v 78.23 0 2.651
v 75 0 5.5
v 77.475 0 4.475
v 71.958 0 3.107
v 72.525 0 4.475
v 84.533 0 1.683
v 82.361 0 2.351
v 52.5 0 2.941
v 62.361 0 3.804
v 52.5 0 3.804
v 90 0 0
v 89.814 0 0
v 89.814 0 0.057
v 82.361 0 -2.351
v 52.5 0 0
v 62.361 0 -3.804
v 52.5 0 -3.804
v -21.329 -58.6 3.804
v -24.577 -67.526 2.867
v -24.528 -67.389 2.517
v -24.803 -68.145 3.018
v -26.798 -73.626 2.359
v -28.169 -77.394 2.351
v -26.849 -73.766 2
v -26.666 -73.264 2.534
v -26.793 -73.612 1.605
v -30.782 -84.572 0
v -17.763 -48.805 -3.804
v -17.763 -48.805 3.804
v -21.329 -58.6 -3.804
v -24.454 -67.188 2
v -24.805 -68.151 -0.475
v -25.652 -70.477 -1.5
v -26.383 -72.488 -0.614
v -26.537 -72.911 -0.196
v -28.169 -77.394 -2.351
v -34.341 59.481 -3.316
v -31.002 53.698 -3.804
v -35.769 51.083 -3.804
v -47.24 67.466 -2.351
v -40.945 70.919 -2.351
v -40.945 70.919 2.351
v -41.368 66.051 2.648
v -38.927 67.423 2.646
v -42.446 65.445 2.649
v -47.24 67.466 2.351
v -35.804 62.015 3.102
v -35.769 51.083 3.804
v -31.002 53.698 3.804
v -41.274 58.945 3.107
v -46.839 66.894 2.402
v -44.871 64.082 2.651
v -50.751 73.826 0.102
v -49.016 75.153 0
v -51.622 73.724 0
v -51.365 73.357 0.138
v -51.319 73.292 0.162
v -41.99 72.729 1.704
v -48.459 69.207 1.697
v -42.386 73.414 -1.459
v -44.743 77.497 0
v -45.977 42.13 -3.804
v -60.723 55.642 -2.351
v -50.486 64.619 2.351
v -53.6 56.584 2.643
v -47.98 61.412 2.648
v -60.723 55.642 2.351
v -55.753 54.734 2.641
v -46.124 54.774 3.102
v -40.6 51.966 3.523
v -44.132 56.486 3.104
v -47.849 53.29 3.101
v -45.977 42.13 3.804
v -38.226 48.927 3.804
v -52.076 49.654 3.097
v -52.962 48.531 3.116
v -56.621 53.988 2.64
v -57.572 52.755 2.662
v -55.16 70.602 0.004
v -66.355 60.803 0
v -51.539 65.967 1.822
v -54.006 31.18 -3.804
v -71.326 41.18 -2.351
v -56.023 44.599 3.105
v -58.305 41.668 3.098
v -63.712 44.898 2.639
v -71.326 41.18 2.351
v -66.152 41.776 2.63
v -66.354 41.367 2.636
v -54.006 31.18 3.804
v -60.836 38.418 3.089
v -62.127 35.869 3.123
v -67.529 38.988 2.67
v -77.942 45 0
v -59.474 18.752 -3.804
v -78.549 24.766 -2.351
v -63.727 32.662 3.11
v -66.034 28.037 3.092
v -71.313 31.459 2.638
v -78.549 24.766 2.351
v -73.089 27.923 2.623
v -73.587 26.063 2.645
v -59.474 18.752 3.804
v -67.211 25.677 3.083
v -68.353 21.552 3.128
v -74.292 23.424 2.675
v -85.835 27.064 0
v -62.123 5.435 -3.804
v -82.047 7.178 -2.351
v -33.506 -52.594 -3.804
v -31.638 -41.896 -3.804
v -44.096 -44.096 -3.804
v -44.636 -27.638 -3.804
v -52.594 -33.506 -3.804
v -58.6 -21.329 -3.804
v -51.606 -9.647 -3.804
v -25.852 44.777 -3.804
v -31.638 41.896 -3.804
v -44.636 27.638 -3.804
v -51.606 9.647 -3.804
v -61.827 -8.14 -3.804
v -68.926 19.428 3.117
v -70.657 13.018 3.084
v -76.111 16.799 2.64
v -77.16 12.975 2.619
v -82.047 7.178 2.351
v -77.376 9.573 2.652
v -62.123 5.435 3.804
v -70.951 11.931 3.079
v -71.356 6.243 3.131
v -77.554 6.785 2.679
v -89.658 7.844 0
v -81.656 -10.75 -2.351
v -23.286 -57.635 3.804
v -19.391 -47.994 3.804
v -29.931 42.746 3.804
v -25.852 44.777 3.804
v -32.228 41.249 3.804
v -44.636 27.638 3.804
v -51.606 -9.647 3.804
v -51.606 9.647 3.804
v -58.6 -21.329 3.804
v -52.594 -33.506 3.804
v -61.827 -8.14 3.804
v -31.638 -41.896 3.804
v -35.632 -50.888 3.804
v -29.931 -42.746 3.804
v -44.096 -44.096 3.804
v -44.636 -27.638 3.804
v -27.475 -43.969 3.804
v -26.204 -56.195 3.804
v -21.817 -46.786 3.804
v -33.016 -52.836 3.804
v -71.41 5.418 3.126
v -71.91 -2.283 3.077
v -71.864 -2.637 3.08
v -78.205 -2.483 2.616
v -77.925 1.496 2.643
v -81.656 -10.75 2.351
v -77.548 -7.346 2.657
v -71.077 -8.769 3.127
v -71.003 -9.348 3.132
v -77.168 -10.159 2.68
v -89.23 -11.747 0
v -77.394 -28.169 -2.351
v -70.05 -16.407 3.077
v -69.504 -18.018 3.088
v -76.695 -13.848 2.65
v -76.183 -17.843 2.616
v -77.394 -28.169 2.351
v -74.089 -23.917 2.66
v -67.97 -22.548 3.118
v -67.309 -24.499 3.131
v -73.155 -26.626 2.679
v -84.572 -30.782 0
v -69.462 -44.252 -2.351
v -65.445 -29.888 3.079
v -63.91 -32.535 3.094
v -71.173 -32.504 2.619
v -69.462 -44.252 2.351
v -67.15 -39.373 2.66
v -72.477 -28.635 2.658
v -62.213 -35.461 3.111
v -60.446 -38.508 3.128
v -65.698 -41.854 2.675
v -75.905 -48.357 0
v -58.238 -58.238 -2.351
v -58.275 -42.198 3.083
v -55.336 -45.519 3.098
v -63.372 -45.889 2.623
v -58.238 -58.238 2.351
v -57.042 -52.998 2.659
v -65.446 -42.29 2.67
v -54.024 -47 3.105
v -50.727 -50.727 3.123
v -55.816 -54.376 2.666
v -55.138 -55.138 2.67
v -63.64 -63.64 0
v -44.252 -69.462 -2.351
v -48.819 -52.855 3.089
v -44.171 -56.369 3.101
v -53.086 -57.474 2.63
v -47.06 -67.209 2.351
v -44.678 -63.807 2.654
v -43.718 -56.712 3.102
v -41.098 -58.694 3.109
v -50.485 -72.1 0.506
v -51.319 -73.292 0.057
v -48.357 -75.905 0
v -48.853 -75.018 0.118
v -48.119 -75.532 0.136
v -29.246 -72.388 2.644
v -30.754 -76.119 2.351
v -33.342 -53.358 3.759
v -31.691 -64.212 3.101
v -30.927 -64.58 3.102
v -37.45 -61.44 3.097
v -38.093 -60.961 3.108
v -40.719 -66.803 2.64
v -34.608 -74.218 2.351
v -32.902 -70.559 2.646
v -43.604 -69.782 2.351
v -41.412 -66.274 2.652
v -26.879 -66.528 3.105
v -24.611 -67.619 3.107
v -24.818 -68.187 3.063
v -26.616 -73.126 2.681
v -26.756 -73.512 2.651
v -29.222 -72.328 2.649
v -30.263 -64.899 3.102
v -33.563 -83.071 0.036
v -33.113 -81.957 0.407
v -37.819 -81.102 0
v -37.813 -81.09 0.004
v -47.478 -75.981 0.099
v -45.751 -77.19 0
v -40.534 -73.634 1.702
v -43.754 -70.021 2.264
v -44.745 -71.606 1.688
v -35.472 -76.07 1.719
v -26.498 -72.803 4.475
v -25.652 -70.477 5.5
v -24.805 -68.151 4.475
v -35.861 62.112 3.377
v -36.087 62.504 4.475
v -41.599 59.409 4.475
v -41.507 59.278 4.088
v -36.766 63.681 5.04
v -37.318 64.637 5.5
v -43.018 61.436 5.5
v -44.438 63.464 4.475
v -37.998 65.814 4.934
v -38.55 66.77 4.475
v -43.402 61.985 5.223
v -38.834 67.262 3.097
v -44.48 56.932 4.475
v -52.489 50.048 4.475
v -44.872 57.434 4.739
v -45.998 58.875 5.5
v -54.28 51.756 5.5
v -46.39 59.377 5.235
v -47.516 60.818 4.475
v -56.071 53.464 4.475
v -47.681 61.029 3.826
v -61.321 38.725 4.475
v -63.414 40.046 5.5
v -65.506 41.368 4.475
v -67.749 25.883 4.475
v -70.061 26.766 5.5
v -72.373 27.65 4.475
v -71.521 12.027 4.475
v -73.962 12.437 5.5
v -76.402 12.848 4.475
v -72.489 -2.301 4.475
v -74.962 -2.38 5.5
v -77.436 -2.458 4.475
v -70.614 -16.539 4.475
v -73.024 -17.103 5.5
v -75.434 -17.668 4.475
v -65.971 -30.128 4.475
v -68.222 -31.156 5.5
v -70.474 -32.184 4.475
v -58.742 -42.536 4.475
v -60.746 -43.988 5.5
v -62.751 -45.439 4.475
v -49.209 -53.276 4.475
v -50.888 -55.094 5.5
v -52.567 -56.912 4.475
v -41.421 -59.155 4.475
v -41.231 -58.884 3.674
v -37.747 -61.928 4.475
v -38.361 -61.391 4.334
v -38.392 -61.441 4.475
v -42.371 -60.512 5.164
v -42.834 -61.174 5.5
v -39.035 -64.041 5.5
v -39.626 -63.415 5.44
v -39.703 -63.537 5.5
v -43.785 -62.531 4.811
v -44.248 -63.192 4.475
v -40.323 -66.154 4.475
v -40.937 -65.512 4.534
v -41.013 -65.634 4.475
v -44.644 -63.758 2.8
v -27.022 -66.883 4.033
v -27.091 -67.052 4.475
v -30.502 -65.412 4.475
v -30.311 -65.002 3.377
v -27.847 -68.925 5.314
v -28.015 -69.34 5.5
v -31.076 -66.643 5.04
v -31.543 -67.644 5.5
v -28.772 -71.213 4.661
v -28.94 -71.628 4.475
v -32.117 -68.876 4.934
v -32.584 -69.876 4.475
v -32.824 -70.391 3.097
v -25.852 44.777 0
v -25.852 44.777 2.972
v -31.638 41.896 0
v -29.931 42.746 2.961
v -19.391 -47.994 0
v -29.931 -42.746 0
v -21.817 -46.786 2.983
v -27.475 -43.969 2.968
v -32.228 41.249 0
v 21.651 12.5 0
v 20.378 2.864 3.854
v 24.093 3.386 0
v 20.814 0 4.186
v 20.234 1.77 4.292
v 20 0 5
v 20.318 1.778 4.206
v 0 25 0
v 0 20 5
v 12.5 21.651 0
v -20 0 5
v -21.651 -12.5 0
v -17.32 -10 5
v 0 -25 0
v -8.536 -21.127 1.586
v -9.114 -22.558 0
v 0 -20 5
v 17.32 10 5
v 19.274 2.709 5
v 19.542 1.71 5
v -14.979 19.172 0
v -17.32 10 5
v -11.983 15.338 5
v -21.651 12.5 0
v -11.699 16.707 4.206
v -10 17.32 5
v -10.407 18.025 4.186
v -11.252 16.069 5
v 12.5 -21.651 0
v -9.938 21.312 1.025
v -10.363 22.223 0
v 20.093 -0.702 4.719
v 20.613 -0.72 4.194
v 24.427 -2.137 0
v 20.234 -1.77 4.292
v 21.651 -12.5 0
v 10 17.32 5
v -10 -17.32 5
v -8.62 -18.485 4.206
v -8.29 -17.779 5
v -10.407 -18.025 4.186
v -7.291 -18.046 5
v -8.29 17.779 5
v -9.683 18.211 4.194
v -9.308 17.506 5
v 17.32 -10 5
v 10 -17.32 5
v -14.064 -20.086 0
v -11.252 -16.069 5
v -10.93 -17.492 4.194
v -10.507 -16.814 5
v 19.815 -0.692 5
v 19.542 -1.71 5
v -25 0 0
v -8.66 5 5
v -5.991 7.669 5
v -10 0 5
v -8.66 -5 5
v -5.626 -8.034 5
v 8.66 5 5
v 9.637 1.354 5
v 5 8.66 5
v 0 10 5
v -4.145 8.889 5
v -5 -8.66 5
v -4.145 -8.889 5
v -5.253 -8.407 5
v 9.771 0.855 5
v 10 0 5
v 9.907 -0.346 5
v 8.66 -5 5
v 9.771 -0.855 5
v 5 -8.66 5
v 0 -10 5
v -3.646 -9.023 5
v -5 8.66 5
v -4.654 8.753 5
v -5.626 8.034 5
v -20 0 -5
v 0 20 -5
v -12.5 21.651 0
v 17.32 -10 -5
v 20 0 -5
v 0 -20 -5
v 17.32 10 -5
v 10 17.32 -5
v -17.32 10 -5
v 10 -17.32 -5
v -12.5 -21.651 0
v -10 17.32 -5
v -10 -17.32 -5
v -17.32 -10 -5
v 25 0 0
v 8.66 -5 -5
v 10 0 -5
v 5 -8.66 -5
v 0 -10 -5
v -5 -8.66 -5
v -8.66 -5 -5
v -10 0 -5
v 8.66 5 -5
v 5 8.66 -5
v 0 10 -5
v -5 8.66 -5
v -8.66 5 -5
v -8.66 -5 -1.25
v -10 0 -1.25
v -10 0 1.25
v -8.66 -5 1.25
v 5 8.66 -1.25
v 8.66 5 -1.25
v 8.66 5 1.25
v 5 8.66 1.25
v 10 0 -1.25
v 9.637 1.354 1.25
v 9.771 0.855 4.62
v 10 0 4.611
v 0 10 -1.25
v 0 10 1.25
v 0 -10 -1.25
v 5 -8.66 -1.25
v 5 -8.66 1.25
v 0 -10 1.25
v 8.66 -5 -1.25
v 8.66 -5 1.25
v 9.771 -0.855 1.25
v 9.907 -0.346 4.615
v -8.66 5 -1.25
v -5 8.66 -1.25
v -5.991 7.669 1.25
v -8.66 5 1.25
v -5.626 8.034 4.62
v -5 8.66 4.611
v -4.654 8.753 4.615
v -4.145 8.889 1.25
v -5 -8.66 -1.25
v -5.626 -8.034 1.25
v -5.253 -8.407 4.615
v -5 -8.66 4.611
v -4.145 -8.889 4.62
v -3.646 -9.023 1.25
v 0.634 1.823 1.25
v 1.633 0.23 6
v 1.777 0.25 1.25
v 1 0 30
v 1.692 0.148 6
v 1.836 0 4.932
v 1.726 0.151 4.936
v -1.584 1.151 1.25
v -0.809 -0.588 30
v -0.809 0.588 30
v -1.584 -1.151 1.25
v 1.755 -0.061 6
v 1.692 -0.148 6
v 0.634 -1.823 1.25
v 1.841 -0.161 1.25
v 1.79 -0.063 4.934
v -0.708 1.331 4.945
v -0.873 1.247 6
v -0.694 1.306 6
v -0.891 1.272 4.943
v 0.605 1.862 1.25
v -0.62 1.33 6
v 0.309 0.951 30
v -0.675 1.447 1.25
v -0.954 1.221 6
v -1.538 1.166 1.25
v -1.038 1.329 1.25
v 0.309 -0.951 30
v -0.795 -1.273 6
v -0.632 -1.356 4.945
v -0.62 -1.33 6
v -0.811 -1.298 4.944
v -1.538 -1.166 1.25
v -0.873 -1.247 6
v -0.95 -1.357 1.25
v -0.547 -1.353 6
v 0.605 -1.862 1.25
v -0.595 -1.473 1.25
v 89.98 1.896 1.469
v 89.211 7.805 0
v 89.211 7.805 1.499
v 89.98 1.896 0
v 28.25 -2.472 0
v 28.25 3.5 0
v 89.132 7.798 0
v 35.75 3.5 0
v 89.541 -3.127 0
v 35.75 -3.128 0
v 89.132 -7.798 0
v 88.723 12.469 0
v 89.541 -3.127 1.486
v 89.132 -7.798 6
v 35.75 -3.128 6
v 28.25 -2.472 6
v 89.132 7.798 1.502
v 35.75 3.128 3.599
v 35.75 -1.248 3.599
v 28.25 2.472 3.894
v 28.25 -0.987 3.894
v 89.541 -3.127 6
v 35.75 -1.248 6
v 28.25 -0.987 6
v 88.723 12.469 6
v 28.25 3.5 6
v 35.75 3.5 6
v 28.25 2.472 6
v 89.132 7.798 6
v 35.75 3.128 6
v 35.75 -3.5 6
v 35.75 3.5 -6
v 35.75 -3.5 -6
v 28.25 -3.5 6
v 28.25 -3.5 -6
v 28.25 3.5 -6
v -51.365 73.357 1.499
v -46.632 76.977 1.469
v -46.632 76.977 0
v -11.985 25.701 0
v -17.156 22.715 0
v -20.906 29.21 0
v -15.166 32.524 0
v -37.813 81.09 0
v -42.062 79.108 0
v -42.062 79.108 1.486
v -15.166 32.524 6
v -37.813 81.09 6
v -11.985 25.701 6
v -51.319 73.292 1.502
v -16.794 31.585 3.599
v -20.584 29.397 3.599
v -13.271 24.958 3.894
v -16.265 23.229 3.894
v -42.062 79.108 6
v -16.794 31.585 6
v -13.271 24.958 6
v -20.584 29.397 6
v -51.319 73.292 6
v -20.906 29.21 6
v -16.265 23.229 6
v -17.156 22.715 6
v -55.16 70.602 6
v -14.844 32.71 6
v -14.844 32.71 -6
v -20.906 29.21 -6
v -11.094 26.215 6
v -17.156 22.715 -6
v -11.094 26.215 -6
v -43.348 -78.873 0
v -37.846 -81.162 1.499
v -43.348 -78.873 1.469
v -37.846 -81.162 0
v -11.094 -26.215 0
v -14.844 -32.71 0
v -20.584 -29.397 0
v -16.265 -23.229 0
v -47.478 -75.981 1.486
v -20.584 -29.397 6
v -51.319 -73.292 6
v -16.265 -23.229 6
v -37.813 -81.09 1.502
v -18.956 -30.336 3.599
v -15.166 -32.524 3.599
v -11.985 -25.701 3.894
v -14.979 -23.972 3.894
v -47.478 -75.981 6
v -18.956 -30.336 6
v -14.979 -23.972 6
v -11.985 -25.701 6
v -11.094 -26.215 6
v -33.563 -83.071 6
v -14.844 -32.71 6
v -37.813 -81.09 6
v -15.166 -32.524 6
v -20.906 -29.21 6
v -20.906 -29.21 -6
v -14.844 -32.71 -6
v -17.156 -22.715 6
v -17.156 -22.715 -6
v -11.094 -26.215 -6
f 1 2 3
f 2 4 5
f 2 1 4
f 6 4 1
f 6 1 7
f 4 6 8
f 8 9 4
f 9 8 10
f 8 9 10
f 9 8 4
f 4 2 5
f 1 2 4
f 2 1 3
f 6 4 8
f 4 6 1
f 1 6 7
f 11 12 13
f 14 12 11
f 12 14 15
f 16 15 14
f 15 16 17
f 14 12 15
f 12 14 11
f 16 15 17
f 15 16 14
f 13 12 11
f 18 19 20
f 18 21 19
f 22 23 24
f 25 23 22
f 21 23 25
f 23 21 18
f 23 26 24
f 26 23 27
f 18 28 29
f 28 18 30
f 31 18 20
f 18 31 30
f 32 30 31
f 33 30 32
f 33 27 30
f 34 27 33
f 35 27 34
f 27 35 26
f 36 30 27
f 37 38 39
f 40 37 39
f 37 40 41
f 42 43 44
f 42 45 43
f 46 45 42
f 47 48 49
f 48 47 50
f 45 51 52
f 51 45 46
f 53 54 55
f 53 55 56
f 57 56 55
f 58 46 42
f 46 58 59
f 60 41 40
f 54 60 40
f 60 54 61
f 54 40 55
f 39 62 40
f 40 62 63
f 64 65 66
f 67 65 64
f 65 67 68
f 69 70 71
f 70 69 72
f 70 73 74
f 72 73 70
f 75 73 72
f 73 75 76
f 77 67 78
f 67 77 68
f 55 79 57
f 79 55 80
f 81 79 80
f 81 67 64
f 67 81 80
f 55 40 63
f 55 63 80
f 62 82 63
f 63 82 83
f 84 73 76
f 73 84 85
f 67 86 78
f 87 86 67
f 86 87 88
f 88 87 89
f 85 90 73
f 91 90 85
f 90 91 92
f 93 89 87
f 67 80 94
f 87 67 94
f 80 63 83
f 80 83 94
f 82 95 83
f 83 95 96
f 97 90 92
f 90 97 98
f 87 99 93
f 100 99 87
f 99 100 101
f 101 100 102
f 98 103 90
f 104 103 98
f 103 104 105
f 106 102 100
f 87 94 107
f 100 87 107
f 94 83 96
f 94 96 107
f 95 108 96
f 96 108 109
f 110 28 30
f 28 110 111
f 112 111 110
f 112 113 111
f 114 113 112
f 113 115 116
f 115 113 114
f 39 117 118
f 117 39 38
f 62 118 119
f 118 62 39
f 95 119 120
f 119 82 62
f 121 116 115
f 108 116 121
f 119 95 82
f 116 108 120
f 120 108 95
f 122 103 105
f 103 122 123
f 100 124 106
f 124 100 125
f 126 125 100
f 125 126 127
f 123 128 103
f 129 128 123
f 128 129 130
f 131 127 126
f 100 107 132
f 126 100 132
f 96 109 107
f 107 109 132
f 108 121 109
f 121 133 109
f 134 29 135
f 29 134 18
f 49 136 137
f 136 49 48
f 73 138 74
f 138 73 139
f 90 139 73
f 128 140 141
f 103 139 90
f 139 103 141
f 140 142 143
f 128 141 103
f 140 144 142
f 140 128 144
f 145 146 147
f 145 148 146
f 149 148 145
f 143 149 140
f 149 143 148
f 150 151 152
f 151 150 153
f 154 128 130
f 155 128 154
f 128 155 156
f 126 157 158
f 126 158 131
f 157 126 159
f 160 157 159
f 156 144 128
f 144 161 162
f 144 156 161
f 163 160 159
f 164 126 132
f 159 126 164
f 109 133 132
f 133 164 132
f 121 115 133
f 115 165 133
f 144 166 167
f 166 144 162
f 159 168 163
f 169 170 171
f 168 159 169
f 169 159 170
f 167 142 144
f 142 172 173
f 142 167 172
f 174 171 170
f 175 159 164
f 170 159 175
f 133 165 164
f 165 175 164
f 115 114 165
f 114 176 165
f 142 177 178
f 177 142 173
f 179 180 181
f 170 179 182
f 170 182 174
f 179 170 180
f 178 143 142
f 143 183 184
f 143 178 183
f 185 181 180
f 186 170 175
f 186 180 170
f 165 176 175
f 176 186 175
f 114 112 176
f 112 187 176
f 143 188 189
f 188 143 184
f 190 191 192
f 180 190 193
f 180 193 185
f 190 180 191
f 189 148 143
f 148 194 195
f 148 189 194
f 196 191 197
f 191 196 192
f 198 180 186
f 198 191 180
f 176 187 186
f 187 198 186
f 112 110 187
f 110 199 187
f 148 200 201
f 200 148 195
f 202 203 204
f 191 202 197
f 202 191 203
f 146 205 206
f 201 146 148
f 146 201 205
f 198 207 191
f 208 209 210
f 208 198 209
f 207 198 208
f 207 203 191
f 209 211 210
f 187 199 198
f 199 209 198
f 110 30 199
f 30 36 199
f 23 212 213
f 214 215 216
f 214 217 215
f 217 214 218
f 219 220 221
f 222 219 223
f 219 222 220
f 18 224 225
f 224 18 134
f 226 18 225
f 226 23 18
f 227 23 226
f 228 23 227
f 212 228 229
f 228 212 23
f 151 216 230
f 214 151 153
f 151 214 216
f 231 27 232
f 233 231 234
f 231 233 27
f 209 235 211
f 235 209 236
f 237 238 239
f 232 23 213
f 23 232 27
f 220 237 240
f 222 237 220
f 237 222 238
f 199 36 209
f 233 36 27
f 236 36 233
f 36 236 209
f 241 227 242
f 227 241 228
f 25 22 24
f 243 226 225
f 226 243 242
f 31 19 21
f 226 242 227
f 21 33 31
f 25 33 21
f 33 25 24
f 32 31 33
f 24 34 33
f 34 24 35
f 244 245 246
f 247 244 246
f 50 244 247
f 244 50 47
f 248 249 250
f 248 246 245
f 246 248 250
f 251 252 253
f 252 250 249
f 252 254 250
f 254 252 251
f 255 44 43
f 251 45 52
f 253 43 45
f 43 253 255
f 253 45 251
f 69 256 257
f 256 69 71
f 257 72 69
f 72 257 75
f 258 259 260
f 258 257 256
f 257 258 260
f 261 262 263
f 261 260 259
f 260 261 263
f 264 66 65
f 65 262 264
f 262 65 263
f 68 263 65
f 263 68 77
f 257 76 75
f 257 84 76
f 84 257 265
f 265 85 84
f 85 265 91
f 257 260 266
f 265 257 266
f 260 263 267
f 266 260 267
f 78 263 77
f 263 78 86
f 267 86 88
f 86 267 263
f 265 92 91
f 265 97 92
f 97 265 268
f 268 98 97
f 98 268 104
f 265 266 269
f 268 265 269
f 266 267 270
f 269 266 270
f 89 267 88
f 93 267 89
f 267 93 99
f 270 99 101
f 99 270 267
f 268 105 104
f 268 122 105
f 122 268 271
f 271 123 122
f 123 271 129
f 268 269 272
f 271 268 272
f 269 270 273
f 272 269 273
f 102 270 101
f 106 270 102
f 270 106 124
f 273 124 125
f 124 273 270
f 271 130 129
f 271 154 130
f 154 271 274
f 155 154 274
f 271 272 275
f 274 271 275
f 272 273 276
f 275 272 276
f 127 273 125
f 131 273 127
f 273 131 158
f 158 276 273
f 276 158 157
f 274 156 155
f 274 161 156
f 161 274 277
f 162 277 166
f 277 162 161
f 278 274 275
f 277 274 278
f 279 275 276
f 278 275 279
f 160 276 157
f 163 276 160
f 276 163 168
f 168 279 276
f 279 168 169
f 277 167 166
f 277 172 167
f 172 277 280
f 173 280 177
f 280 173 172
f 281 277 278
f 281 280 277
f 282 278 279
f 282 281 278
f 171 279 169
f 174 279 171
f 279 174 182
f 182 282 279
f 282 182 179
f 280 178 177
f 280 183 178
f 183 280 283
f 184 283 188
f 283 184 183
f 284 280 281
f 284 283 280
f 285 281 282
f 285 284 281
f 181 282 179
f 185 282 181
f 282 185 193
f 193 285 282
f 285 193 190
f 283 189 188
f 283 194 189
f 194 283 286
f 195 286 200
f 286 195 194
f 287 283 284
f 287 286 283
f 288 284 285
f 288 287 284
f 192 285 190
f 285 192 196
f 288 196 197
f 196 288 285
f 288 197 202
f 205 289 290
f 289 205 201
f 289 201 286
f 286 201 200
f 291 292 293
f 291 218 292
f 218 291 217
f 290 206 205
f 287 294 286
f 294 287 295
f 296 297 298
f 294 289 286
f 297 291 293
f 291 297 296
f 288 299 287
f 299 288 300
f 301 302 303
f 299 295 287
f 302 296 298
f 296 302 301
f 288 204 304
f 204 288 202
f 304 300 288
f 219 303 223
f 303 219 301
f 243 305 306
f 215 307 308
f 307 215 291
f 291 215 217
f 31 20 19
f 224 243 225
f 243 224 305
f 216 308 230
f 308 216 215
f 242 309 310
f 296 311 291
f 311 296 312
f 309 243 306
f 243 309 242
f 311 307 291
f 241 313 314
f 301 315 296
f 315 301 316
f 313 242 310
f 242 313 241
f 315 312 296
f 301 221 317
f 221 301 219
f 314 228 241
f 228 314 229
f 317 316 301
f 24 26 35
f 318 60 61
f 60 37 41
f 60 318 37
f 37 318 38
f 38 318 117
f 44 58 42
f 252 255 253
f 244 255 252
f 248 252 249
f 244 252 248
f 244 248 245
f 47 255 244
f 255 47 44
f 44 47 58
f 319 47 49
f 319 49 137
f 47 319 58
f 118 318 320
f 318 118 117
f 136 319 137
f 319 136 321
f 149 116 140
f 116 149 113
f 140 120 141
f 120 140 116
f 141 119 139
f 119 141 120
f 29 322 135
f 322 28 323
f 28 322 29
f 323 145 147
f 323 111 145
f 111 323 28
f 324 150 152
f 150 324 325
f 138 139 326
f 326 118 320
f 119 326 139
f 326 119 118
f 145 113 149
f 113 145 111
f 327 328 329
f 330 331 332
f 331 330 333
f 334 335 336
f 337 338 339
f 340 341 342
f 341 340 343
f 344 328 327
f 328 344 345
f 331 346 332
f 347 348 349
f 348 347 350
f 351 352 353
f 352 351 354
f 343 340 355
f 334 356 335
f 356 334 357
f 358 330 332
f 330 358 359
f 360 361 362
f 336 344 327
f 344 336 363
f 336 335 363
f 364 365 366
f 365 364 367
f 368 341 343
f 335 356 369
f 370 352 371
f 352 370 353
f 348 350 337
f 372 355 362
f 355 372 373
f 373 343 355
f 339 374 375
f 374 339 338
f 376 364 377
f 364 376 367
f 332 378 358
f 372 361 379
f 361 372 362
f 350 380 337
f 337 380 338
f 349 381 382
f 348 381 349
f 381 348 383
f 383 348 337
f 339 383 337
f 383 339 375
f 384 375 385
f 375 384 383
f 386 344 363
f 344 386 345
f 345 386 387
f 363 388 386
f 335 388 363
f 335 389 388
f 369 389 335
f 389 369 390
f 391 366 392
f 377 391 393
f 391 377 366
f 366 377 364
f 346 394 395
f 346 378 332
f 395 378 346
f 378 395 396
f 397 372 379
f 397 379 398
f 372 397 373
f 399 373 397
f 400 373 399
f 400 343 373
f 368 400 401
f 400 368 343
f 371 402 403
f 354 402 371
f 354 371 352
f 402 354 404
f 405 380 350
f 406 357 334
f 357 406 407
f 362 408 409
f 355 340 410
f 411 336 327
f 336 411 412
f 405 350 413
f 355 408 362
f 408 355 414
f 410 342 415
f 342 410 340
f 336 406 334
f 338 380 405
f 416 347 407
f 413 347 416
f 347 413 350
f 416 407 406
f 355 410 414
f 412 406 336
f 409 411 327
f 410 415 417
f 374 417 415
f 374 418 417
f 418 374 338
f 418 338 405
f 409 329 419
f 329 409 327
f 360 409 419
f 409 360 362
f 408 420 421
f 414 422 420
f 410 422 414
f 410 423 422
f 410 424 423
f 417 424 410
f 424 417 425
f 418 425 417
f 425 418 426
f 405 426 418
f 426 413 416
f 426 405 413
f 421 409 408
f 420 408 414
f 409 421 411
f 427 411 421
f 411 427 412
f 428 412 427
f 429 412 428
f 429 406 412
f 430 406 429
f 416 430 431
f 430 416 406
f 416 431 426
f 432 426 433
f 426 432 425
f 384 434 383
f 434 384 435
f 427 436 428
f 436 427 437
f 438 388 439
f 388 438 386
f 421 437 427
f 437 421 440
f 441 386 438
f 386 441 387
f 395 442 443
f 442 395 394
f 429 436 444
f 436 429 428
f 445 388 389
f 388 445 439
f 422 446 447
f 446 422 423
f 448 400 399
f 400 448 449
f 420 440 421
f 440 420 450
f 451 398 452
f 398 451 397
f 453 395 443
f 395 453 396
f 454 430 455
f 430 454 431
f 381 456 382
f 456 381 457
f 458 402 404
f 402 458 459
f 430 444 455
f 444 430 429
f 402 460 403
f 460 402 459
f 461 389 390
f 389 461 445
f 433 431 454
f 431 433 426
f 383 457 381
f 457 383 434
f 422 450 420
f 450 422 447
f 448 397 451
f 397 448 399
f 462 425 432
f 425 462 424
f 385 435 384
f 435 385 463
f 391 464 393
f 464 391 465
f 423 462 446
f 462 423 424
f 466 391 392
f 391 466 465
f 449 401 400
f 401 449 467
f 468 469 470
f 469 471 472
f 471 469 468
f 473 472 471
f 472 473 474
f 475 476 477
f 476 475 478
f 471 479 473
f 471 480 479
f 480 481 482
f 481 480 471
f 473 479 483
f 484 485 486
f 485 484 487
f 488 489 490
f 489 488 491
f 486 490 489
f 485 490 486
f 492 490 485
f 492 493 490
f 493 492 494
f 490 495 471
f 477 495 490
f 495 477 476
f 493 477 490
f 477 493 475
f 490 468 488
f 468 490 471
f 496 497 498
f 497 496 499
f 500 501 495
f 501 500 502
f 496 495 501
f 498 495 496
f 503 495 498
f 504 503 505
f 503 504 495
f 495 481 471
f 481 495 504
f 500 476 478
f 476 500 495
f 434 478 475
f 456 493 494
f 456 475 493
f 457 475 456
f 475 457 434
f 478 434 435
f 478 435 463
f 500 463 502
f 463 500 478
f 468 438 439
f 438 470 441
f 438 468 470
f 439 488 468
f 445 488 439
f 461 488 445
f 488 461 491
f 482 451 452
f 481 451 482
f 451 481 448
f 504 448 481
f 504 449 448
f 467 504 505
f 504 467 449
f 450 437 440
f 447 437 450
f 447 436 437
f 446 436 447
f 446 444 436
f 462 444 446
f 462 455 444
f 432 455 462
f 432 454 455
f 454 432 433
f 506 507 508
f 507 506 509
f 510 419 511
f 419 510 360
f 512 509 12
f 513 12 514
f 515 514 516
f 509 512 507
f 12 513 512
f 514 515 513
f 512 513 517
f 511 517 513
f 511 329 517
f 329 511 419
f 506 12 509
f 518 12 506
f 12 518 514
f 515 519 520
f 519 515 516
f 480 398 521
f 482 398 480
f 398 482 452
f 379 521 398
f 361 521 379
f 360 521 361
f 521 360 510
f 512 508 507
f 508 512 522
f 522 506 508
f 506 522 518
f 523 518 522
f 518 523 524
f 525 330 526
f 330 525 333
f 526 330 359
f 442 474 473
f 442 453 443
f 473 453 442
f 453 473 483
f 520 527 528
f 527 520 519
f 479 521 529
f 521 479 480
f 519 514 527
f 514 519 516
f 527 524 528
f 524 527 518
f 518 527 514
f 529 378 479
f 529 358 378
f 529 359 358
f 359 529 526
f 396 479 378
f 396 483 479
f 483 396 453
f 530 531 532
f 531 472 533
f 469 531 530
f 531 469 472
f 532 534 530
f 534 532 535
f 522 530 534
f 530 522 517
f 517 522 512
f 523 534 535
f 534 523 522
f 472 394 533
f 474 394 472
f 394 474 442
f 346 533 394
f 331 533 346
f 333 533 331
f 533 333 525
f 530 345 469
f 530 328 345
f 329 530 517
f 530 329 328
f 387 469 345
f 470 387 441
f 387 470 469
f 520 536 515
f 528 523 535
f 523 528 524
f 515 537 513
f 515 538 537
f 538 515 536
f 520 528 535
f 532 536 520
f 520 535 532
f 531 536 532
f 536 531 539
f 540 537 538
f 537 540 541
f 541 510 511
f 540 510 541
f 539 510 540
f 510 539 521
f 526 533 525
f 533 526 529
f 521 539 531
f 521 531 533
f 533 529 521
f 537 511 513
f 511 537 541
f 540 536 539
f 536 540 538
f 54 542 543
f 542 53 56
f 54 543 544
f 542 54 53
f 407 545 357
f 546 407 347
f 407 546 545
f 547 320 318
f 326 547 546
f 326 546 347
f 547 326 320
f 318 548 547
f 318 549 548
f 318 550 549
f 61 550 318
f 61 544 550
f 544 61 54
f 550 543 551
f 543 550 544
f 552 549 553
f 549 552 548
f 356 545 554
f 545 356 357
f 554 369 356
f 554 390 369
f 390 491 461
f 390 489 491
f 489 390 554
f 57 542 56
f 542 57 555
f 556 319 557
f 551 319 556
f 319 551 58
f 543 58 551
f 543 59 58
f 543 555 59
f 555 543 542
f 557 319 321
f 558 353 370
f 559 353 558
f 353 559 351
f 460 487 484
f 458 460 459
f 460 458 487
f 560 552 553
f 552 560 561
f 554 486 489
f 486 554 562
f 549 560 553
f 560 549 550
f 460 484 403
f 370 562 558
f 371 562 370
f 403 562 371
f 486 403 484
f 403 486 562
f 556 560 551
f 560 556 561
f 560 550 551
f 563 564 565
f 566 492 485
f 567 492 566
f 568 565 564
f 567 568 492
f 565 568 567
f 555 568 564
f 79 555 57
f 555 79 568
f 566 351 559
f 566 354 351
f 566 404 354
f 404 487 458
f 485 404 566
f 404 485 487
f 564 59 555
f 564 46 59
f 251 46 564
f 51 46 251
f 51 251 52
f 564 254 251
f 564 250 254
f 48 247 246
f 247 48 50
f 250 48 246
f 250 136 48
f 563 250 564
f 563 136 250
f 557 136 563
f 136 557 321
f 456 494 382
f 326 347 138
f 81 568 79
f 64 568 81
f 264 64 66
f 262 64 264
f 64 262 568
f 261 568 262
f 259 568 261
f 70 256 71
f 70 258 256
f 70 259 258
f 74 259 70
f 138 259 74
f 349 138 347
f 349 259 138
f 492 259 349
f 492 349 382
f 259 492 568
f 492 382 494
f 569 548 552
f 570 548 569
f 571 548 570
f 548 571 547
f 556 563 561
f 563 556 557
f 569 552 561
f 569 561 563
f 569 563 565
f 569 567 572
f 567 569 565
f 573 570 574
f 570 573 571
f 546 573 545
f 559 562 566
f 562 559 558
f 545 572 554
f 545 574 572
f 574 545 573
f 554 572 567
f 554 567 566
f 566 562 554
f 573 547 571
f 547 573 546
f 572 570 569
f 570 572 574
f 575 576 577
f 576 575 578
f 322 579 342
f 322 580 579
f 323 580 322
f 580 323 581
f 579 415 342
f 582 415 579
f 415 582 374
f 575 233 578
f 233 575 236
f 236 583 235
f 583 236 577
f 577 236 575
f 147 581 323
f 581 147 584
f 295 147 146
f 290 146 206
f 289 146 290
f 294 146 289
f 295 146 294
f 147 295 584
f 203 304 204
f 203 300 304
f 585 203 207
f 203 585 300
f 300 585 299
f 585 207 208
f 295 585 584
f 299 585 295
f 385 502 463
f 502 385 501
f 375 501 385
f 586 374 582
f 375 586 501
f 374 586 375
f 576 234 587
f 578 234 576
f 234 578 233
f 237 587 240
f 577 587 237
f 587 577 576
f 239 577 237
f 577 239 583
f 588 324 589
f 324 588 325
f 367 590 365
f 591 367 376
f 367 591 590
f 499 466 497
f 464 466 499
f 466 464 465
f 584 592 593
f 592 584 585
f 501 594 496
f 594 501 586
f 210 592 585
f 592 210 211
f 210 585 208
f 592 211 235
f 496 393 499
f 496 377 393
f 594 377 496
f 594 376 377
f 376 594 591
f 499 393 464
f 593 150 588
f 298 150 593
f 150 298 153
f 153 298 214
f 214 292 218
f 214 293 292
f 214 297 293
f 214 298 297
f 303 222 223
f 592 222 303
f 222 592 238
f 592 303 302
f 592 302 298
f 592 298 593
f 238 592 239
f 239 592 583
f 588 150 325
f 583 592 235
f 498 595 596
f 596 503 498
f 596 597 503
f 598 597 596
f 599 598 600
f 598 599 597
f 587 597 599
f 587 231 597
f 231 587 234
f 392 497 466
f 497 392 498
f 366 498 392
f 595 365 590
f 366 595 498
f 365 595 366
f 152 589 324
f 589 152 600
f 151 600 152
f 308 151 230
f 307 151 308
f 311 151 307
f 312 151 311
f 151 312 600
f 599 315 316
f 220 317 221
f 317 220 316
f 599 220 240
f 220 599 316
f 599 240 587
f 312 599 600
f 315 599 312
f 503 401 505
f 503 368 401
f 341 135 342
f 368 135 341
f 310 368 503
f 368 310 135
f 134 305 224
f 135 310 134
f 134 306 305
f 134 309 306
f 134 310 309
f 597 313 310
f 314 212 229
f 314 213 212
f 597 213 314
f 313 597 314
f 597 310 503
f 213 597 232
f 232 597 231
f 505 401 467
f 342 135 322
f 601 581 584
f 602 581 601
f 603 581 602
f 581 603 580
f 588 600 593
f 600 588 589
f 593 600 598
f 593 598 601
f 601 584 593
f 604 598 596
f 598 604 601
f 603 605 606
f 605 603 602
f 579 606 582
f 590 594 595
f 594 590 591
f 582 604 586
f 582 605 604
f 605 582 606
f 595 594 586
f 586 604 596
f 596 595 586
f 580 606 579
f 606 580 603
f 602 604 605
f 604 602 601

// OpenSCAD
// file: wedge.scad
//Title: Wedge Module
//Author: Alex English - ProtoParadigm
//Date: 1/4/2013
//License: Creative Commons - Share Alike - Attribution

//Usage: Include in your other .scad projects and call wedge with arguments for the height of the wedge, the radius of the wedge, and the angle of the wedge in degrees.  The resulting wedge will be placed with the point at the origin, extending into the z axis, with the angle starting at the x axis and extending counter-clockwise as per the right-hand rule.

module wedge_180(h, r, d)
{
	rotate(d) difference()
	{
		rotate(180-d) difference()
		{
			cylinder(h = h, r = r);
			translate([-(r+1), 0, -1]) cube([r*2+2, r+1, h+2]);
		}
		translate([-(r+1), 0, -1]) cube([r*2+2, r+1, h+2]);
	}
}

module wedge(h, r, d)
{
	if(d <= 180)
		wedge_180(h, r, d);
	else
		rotate(d) difference()
		{
			cylinder(h = h, r = r);
			wedge_180(h, r, 360-d);
		}
}

//Example: wedge(10, 20, 33); //would create a wedge 10 high, with a radius of 20, and an angle of 33 degrees.
// main file
include <wedge.scad>;

/* loosley modeled after cbase hackerspace space station */


module outer_ring()
{
	difference() {
		union() {
			scale(v = [1, 1, 0.1])
				rotate_extrude(height = 5, angle = 250, convexity = 10)
					translate([5, 0, 0])
						circle(r = 4, $fn = 10);
			translate([0, 0, 0.20])
			rotate_extrude(height = 0.5, angle=250, convexity=10, $fn=32)
					translate([7.50, 0, 0])
						circle(r = 0.35, $fn=8);
		}
		cylinder(h = 10, r1 = 5.25, r2 = 5.25, center = true);
		translate(v = [0, 0, -2])
			wedge(5, 10, 120);
	}
}

module central_hub()
{
	difference() {
		union() {
			cylinder(h = 0.5, r1 = 2.5, r2 = 2, $fn=12);
			rotate(a = 180, v = [0, 1, 0])
				cylinder(h = 0.5, r1 = 2.5, r2 = 2, $fn=12);
		}
		cylinder(h = 2, r1 = 1, r2 = 1, center = true, $fn = 12);
	}
	cylinder(h = 3, r1 = 0.2, r2 = 0.1);
	cylinder(h = 0.25, r1 = 2.1, r2 = 2.1, center = true);
}

module spoke()
{
	difference() {
	rotate(a = -5, v = [0, 0, 1])
		wedge(0.5, 9, 10);
	rotate(a = 2.25, v = [0, 1, 0])
		translate(v = [0, -4.5, 0.5])
			cube(size = [9, 9, 0.5]);
	}
	rotate(a = -5, v = [0, 0, 1])
		wedge(0.6, 9, 3);
	rotate(a = 5, v = [0, 0, 1])
		wedge(0.6, 9, 3);
	translate(v = [3.2, 0, 0])
			cube(size = [0.75, 0.7, 1.2], center = true);
}

module spokes()
{
	union() {
		spoke(0.5, 9, 10);
		rotate(a = 120, v = [0, 0, 1])
			spoke(0.5, 9, 10);
		rotate(a = -120, v = [0, 0, 1])
			spoke(0.5, 9, 10);
	}
}

scale(v = [10, 10, 10])
union() {
	outer_ring();
	central_hub();
	spokes();
}
